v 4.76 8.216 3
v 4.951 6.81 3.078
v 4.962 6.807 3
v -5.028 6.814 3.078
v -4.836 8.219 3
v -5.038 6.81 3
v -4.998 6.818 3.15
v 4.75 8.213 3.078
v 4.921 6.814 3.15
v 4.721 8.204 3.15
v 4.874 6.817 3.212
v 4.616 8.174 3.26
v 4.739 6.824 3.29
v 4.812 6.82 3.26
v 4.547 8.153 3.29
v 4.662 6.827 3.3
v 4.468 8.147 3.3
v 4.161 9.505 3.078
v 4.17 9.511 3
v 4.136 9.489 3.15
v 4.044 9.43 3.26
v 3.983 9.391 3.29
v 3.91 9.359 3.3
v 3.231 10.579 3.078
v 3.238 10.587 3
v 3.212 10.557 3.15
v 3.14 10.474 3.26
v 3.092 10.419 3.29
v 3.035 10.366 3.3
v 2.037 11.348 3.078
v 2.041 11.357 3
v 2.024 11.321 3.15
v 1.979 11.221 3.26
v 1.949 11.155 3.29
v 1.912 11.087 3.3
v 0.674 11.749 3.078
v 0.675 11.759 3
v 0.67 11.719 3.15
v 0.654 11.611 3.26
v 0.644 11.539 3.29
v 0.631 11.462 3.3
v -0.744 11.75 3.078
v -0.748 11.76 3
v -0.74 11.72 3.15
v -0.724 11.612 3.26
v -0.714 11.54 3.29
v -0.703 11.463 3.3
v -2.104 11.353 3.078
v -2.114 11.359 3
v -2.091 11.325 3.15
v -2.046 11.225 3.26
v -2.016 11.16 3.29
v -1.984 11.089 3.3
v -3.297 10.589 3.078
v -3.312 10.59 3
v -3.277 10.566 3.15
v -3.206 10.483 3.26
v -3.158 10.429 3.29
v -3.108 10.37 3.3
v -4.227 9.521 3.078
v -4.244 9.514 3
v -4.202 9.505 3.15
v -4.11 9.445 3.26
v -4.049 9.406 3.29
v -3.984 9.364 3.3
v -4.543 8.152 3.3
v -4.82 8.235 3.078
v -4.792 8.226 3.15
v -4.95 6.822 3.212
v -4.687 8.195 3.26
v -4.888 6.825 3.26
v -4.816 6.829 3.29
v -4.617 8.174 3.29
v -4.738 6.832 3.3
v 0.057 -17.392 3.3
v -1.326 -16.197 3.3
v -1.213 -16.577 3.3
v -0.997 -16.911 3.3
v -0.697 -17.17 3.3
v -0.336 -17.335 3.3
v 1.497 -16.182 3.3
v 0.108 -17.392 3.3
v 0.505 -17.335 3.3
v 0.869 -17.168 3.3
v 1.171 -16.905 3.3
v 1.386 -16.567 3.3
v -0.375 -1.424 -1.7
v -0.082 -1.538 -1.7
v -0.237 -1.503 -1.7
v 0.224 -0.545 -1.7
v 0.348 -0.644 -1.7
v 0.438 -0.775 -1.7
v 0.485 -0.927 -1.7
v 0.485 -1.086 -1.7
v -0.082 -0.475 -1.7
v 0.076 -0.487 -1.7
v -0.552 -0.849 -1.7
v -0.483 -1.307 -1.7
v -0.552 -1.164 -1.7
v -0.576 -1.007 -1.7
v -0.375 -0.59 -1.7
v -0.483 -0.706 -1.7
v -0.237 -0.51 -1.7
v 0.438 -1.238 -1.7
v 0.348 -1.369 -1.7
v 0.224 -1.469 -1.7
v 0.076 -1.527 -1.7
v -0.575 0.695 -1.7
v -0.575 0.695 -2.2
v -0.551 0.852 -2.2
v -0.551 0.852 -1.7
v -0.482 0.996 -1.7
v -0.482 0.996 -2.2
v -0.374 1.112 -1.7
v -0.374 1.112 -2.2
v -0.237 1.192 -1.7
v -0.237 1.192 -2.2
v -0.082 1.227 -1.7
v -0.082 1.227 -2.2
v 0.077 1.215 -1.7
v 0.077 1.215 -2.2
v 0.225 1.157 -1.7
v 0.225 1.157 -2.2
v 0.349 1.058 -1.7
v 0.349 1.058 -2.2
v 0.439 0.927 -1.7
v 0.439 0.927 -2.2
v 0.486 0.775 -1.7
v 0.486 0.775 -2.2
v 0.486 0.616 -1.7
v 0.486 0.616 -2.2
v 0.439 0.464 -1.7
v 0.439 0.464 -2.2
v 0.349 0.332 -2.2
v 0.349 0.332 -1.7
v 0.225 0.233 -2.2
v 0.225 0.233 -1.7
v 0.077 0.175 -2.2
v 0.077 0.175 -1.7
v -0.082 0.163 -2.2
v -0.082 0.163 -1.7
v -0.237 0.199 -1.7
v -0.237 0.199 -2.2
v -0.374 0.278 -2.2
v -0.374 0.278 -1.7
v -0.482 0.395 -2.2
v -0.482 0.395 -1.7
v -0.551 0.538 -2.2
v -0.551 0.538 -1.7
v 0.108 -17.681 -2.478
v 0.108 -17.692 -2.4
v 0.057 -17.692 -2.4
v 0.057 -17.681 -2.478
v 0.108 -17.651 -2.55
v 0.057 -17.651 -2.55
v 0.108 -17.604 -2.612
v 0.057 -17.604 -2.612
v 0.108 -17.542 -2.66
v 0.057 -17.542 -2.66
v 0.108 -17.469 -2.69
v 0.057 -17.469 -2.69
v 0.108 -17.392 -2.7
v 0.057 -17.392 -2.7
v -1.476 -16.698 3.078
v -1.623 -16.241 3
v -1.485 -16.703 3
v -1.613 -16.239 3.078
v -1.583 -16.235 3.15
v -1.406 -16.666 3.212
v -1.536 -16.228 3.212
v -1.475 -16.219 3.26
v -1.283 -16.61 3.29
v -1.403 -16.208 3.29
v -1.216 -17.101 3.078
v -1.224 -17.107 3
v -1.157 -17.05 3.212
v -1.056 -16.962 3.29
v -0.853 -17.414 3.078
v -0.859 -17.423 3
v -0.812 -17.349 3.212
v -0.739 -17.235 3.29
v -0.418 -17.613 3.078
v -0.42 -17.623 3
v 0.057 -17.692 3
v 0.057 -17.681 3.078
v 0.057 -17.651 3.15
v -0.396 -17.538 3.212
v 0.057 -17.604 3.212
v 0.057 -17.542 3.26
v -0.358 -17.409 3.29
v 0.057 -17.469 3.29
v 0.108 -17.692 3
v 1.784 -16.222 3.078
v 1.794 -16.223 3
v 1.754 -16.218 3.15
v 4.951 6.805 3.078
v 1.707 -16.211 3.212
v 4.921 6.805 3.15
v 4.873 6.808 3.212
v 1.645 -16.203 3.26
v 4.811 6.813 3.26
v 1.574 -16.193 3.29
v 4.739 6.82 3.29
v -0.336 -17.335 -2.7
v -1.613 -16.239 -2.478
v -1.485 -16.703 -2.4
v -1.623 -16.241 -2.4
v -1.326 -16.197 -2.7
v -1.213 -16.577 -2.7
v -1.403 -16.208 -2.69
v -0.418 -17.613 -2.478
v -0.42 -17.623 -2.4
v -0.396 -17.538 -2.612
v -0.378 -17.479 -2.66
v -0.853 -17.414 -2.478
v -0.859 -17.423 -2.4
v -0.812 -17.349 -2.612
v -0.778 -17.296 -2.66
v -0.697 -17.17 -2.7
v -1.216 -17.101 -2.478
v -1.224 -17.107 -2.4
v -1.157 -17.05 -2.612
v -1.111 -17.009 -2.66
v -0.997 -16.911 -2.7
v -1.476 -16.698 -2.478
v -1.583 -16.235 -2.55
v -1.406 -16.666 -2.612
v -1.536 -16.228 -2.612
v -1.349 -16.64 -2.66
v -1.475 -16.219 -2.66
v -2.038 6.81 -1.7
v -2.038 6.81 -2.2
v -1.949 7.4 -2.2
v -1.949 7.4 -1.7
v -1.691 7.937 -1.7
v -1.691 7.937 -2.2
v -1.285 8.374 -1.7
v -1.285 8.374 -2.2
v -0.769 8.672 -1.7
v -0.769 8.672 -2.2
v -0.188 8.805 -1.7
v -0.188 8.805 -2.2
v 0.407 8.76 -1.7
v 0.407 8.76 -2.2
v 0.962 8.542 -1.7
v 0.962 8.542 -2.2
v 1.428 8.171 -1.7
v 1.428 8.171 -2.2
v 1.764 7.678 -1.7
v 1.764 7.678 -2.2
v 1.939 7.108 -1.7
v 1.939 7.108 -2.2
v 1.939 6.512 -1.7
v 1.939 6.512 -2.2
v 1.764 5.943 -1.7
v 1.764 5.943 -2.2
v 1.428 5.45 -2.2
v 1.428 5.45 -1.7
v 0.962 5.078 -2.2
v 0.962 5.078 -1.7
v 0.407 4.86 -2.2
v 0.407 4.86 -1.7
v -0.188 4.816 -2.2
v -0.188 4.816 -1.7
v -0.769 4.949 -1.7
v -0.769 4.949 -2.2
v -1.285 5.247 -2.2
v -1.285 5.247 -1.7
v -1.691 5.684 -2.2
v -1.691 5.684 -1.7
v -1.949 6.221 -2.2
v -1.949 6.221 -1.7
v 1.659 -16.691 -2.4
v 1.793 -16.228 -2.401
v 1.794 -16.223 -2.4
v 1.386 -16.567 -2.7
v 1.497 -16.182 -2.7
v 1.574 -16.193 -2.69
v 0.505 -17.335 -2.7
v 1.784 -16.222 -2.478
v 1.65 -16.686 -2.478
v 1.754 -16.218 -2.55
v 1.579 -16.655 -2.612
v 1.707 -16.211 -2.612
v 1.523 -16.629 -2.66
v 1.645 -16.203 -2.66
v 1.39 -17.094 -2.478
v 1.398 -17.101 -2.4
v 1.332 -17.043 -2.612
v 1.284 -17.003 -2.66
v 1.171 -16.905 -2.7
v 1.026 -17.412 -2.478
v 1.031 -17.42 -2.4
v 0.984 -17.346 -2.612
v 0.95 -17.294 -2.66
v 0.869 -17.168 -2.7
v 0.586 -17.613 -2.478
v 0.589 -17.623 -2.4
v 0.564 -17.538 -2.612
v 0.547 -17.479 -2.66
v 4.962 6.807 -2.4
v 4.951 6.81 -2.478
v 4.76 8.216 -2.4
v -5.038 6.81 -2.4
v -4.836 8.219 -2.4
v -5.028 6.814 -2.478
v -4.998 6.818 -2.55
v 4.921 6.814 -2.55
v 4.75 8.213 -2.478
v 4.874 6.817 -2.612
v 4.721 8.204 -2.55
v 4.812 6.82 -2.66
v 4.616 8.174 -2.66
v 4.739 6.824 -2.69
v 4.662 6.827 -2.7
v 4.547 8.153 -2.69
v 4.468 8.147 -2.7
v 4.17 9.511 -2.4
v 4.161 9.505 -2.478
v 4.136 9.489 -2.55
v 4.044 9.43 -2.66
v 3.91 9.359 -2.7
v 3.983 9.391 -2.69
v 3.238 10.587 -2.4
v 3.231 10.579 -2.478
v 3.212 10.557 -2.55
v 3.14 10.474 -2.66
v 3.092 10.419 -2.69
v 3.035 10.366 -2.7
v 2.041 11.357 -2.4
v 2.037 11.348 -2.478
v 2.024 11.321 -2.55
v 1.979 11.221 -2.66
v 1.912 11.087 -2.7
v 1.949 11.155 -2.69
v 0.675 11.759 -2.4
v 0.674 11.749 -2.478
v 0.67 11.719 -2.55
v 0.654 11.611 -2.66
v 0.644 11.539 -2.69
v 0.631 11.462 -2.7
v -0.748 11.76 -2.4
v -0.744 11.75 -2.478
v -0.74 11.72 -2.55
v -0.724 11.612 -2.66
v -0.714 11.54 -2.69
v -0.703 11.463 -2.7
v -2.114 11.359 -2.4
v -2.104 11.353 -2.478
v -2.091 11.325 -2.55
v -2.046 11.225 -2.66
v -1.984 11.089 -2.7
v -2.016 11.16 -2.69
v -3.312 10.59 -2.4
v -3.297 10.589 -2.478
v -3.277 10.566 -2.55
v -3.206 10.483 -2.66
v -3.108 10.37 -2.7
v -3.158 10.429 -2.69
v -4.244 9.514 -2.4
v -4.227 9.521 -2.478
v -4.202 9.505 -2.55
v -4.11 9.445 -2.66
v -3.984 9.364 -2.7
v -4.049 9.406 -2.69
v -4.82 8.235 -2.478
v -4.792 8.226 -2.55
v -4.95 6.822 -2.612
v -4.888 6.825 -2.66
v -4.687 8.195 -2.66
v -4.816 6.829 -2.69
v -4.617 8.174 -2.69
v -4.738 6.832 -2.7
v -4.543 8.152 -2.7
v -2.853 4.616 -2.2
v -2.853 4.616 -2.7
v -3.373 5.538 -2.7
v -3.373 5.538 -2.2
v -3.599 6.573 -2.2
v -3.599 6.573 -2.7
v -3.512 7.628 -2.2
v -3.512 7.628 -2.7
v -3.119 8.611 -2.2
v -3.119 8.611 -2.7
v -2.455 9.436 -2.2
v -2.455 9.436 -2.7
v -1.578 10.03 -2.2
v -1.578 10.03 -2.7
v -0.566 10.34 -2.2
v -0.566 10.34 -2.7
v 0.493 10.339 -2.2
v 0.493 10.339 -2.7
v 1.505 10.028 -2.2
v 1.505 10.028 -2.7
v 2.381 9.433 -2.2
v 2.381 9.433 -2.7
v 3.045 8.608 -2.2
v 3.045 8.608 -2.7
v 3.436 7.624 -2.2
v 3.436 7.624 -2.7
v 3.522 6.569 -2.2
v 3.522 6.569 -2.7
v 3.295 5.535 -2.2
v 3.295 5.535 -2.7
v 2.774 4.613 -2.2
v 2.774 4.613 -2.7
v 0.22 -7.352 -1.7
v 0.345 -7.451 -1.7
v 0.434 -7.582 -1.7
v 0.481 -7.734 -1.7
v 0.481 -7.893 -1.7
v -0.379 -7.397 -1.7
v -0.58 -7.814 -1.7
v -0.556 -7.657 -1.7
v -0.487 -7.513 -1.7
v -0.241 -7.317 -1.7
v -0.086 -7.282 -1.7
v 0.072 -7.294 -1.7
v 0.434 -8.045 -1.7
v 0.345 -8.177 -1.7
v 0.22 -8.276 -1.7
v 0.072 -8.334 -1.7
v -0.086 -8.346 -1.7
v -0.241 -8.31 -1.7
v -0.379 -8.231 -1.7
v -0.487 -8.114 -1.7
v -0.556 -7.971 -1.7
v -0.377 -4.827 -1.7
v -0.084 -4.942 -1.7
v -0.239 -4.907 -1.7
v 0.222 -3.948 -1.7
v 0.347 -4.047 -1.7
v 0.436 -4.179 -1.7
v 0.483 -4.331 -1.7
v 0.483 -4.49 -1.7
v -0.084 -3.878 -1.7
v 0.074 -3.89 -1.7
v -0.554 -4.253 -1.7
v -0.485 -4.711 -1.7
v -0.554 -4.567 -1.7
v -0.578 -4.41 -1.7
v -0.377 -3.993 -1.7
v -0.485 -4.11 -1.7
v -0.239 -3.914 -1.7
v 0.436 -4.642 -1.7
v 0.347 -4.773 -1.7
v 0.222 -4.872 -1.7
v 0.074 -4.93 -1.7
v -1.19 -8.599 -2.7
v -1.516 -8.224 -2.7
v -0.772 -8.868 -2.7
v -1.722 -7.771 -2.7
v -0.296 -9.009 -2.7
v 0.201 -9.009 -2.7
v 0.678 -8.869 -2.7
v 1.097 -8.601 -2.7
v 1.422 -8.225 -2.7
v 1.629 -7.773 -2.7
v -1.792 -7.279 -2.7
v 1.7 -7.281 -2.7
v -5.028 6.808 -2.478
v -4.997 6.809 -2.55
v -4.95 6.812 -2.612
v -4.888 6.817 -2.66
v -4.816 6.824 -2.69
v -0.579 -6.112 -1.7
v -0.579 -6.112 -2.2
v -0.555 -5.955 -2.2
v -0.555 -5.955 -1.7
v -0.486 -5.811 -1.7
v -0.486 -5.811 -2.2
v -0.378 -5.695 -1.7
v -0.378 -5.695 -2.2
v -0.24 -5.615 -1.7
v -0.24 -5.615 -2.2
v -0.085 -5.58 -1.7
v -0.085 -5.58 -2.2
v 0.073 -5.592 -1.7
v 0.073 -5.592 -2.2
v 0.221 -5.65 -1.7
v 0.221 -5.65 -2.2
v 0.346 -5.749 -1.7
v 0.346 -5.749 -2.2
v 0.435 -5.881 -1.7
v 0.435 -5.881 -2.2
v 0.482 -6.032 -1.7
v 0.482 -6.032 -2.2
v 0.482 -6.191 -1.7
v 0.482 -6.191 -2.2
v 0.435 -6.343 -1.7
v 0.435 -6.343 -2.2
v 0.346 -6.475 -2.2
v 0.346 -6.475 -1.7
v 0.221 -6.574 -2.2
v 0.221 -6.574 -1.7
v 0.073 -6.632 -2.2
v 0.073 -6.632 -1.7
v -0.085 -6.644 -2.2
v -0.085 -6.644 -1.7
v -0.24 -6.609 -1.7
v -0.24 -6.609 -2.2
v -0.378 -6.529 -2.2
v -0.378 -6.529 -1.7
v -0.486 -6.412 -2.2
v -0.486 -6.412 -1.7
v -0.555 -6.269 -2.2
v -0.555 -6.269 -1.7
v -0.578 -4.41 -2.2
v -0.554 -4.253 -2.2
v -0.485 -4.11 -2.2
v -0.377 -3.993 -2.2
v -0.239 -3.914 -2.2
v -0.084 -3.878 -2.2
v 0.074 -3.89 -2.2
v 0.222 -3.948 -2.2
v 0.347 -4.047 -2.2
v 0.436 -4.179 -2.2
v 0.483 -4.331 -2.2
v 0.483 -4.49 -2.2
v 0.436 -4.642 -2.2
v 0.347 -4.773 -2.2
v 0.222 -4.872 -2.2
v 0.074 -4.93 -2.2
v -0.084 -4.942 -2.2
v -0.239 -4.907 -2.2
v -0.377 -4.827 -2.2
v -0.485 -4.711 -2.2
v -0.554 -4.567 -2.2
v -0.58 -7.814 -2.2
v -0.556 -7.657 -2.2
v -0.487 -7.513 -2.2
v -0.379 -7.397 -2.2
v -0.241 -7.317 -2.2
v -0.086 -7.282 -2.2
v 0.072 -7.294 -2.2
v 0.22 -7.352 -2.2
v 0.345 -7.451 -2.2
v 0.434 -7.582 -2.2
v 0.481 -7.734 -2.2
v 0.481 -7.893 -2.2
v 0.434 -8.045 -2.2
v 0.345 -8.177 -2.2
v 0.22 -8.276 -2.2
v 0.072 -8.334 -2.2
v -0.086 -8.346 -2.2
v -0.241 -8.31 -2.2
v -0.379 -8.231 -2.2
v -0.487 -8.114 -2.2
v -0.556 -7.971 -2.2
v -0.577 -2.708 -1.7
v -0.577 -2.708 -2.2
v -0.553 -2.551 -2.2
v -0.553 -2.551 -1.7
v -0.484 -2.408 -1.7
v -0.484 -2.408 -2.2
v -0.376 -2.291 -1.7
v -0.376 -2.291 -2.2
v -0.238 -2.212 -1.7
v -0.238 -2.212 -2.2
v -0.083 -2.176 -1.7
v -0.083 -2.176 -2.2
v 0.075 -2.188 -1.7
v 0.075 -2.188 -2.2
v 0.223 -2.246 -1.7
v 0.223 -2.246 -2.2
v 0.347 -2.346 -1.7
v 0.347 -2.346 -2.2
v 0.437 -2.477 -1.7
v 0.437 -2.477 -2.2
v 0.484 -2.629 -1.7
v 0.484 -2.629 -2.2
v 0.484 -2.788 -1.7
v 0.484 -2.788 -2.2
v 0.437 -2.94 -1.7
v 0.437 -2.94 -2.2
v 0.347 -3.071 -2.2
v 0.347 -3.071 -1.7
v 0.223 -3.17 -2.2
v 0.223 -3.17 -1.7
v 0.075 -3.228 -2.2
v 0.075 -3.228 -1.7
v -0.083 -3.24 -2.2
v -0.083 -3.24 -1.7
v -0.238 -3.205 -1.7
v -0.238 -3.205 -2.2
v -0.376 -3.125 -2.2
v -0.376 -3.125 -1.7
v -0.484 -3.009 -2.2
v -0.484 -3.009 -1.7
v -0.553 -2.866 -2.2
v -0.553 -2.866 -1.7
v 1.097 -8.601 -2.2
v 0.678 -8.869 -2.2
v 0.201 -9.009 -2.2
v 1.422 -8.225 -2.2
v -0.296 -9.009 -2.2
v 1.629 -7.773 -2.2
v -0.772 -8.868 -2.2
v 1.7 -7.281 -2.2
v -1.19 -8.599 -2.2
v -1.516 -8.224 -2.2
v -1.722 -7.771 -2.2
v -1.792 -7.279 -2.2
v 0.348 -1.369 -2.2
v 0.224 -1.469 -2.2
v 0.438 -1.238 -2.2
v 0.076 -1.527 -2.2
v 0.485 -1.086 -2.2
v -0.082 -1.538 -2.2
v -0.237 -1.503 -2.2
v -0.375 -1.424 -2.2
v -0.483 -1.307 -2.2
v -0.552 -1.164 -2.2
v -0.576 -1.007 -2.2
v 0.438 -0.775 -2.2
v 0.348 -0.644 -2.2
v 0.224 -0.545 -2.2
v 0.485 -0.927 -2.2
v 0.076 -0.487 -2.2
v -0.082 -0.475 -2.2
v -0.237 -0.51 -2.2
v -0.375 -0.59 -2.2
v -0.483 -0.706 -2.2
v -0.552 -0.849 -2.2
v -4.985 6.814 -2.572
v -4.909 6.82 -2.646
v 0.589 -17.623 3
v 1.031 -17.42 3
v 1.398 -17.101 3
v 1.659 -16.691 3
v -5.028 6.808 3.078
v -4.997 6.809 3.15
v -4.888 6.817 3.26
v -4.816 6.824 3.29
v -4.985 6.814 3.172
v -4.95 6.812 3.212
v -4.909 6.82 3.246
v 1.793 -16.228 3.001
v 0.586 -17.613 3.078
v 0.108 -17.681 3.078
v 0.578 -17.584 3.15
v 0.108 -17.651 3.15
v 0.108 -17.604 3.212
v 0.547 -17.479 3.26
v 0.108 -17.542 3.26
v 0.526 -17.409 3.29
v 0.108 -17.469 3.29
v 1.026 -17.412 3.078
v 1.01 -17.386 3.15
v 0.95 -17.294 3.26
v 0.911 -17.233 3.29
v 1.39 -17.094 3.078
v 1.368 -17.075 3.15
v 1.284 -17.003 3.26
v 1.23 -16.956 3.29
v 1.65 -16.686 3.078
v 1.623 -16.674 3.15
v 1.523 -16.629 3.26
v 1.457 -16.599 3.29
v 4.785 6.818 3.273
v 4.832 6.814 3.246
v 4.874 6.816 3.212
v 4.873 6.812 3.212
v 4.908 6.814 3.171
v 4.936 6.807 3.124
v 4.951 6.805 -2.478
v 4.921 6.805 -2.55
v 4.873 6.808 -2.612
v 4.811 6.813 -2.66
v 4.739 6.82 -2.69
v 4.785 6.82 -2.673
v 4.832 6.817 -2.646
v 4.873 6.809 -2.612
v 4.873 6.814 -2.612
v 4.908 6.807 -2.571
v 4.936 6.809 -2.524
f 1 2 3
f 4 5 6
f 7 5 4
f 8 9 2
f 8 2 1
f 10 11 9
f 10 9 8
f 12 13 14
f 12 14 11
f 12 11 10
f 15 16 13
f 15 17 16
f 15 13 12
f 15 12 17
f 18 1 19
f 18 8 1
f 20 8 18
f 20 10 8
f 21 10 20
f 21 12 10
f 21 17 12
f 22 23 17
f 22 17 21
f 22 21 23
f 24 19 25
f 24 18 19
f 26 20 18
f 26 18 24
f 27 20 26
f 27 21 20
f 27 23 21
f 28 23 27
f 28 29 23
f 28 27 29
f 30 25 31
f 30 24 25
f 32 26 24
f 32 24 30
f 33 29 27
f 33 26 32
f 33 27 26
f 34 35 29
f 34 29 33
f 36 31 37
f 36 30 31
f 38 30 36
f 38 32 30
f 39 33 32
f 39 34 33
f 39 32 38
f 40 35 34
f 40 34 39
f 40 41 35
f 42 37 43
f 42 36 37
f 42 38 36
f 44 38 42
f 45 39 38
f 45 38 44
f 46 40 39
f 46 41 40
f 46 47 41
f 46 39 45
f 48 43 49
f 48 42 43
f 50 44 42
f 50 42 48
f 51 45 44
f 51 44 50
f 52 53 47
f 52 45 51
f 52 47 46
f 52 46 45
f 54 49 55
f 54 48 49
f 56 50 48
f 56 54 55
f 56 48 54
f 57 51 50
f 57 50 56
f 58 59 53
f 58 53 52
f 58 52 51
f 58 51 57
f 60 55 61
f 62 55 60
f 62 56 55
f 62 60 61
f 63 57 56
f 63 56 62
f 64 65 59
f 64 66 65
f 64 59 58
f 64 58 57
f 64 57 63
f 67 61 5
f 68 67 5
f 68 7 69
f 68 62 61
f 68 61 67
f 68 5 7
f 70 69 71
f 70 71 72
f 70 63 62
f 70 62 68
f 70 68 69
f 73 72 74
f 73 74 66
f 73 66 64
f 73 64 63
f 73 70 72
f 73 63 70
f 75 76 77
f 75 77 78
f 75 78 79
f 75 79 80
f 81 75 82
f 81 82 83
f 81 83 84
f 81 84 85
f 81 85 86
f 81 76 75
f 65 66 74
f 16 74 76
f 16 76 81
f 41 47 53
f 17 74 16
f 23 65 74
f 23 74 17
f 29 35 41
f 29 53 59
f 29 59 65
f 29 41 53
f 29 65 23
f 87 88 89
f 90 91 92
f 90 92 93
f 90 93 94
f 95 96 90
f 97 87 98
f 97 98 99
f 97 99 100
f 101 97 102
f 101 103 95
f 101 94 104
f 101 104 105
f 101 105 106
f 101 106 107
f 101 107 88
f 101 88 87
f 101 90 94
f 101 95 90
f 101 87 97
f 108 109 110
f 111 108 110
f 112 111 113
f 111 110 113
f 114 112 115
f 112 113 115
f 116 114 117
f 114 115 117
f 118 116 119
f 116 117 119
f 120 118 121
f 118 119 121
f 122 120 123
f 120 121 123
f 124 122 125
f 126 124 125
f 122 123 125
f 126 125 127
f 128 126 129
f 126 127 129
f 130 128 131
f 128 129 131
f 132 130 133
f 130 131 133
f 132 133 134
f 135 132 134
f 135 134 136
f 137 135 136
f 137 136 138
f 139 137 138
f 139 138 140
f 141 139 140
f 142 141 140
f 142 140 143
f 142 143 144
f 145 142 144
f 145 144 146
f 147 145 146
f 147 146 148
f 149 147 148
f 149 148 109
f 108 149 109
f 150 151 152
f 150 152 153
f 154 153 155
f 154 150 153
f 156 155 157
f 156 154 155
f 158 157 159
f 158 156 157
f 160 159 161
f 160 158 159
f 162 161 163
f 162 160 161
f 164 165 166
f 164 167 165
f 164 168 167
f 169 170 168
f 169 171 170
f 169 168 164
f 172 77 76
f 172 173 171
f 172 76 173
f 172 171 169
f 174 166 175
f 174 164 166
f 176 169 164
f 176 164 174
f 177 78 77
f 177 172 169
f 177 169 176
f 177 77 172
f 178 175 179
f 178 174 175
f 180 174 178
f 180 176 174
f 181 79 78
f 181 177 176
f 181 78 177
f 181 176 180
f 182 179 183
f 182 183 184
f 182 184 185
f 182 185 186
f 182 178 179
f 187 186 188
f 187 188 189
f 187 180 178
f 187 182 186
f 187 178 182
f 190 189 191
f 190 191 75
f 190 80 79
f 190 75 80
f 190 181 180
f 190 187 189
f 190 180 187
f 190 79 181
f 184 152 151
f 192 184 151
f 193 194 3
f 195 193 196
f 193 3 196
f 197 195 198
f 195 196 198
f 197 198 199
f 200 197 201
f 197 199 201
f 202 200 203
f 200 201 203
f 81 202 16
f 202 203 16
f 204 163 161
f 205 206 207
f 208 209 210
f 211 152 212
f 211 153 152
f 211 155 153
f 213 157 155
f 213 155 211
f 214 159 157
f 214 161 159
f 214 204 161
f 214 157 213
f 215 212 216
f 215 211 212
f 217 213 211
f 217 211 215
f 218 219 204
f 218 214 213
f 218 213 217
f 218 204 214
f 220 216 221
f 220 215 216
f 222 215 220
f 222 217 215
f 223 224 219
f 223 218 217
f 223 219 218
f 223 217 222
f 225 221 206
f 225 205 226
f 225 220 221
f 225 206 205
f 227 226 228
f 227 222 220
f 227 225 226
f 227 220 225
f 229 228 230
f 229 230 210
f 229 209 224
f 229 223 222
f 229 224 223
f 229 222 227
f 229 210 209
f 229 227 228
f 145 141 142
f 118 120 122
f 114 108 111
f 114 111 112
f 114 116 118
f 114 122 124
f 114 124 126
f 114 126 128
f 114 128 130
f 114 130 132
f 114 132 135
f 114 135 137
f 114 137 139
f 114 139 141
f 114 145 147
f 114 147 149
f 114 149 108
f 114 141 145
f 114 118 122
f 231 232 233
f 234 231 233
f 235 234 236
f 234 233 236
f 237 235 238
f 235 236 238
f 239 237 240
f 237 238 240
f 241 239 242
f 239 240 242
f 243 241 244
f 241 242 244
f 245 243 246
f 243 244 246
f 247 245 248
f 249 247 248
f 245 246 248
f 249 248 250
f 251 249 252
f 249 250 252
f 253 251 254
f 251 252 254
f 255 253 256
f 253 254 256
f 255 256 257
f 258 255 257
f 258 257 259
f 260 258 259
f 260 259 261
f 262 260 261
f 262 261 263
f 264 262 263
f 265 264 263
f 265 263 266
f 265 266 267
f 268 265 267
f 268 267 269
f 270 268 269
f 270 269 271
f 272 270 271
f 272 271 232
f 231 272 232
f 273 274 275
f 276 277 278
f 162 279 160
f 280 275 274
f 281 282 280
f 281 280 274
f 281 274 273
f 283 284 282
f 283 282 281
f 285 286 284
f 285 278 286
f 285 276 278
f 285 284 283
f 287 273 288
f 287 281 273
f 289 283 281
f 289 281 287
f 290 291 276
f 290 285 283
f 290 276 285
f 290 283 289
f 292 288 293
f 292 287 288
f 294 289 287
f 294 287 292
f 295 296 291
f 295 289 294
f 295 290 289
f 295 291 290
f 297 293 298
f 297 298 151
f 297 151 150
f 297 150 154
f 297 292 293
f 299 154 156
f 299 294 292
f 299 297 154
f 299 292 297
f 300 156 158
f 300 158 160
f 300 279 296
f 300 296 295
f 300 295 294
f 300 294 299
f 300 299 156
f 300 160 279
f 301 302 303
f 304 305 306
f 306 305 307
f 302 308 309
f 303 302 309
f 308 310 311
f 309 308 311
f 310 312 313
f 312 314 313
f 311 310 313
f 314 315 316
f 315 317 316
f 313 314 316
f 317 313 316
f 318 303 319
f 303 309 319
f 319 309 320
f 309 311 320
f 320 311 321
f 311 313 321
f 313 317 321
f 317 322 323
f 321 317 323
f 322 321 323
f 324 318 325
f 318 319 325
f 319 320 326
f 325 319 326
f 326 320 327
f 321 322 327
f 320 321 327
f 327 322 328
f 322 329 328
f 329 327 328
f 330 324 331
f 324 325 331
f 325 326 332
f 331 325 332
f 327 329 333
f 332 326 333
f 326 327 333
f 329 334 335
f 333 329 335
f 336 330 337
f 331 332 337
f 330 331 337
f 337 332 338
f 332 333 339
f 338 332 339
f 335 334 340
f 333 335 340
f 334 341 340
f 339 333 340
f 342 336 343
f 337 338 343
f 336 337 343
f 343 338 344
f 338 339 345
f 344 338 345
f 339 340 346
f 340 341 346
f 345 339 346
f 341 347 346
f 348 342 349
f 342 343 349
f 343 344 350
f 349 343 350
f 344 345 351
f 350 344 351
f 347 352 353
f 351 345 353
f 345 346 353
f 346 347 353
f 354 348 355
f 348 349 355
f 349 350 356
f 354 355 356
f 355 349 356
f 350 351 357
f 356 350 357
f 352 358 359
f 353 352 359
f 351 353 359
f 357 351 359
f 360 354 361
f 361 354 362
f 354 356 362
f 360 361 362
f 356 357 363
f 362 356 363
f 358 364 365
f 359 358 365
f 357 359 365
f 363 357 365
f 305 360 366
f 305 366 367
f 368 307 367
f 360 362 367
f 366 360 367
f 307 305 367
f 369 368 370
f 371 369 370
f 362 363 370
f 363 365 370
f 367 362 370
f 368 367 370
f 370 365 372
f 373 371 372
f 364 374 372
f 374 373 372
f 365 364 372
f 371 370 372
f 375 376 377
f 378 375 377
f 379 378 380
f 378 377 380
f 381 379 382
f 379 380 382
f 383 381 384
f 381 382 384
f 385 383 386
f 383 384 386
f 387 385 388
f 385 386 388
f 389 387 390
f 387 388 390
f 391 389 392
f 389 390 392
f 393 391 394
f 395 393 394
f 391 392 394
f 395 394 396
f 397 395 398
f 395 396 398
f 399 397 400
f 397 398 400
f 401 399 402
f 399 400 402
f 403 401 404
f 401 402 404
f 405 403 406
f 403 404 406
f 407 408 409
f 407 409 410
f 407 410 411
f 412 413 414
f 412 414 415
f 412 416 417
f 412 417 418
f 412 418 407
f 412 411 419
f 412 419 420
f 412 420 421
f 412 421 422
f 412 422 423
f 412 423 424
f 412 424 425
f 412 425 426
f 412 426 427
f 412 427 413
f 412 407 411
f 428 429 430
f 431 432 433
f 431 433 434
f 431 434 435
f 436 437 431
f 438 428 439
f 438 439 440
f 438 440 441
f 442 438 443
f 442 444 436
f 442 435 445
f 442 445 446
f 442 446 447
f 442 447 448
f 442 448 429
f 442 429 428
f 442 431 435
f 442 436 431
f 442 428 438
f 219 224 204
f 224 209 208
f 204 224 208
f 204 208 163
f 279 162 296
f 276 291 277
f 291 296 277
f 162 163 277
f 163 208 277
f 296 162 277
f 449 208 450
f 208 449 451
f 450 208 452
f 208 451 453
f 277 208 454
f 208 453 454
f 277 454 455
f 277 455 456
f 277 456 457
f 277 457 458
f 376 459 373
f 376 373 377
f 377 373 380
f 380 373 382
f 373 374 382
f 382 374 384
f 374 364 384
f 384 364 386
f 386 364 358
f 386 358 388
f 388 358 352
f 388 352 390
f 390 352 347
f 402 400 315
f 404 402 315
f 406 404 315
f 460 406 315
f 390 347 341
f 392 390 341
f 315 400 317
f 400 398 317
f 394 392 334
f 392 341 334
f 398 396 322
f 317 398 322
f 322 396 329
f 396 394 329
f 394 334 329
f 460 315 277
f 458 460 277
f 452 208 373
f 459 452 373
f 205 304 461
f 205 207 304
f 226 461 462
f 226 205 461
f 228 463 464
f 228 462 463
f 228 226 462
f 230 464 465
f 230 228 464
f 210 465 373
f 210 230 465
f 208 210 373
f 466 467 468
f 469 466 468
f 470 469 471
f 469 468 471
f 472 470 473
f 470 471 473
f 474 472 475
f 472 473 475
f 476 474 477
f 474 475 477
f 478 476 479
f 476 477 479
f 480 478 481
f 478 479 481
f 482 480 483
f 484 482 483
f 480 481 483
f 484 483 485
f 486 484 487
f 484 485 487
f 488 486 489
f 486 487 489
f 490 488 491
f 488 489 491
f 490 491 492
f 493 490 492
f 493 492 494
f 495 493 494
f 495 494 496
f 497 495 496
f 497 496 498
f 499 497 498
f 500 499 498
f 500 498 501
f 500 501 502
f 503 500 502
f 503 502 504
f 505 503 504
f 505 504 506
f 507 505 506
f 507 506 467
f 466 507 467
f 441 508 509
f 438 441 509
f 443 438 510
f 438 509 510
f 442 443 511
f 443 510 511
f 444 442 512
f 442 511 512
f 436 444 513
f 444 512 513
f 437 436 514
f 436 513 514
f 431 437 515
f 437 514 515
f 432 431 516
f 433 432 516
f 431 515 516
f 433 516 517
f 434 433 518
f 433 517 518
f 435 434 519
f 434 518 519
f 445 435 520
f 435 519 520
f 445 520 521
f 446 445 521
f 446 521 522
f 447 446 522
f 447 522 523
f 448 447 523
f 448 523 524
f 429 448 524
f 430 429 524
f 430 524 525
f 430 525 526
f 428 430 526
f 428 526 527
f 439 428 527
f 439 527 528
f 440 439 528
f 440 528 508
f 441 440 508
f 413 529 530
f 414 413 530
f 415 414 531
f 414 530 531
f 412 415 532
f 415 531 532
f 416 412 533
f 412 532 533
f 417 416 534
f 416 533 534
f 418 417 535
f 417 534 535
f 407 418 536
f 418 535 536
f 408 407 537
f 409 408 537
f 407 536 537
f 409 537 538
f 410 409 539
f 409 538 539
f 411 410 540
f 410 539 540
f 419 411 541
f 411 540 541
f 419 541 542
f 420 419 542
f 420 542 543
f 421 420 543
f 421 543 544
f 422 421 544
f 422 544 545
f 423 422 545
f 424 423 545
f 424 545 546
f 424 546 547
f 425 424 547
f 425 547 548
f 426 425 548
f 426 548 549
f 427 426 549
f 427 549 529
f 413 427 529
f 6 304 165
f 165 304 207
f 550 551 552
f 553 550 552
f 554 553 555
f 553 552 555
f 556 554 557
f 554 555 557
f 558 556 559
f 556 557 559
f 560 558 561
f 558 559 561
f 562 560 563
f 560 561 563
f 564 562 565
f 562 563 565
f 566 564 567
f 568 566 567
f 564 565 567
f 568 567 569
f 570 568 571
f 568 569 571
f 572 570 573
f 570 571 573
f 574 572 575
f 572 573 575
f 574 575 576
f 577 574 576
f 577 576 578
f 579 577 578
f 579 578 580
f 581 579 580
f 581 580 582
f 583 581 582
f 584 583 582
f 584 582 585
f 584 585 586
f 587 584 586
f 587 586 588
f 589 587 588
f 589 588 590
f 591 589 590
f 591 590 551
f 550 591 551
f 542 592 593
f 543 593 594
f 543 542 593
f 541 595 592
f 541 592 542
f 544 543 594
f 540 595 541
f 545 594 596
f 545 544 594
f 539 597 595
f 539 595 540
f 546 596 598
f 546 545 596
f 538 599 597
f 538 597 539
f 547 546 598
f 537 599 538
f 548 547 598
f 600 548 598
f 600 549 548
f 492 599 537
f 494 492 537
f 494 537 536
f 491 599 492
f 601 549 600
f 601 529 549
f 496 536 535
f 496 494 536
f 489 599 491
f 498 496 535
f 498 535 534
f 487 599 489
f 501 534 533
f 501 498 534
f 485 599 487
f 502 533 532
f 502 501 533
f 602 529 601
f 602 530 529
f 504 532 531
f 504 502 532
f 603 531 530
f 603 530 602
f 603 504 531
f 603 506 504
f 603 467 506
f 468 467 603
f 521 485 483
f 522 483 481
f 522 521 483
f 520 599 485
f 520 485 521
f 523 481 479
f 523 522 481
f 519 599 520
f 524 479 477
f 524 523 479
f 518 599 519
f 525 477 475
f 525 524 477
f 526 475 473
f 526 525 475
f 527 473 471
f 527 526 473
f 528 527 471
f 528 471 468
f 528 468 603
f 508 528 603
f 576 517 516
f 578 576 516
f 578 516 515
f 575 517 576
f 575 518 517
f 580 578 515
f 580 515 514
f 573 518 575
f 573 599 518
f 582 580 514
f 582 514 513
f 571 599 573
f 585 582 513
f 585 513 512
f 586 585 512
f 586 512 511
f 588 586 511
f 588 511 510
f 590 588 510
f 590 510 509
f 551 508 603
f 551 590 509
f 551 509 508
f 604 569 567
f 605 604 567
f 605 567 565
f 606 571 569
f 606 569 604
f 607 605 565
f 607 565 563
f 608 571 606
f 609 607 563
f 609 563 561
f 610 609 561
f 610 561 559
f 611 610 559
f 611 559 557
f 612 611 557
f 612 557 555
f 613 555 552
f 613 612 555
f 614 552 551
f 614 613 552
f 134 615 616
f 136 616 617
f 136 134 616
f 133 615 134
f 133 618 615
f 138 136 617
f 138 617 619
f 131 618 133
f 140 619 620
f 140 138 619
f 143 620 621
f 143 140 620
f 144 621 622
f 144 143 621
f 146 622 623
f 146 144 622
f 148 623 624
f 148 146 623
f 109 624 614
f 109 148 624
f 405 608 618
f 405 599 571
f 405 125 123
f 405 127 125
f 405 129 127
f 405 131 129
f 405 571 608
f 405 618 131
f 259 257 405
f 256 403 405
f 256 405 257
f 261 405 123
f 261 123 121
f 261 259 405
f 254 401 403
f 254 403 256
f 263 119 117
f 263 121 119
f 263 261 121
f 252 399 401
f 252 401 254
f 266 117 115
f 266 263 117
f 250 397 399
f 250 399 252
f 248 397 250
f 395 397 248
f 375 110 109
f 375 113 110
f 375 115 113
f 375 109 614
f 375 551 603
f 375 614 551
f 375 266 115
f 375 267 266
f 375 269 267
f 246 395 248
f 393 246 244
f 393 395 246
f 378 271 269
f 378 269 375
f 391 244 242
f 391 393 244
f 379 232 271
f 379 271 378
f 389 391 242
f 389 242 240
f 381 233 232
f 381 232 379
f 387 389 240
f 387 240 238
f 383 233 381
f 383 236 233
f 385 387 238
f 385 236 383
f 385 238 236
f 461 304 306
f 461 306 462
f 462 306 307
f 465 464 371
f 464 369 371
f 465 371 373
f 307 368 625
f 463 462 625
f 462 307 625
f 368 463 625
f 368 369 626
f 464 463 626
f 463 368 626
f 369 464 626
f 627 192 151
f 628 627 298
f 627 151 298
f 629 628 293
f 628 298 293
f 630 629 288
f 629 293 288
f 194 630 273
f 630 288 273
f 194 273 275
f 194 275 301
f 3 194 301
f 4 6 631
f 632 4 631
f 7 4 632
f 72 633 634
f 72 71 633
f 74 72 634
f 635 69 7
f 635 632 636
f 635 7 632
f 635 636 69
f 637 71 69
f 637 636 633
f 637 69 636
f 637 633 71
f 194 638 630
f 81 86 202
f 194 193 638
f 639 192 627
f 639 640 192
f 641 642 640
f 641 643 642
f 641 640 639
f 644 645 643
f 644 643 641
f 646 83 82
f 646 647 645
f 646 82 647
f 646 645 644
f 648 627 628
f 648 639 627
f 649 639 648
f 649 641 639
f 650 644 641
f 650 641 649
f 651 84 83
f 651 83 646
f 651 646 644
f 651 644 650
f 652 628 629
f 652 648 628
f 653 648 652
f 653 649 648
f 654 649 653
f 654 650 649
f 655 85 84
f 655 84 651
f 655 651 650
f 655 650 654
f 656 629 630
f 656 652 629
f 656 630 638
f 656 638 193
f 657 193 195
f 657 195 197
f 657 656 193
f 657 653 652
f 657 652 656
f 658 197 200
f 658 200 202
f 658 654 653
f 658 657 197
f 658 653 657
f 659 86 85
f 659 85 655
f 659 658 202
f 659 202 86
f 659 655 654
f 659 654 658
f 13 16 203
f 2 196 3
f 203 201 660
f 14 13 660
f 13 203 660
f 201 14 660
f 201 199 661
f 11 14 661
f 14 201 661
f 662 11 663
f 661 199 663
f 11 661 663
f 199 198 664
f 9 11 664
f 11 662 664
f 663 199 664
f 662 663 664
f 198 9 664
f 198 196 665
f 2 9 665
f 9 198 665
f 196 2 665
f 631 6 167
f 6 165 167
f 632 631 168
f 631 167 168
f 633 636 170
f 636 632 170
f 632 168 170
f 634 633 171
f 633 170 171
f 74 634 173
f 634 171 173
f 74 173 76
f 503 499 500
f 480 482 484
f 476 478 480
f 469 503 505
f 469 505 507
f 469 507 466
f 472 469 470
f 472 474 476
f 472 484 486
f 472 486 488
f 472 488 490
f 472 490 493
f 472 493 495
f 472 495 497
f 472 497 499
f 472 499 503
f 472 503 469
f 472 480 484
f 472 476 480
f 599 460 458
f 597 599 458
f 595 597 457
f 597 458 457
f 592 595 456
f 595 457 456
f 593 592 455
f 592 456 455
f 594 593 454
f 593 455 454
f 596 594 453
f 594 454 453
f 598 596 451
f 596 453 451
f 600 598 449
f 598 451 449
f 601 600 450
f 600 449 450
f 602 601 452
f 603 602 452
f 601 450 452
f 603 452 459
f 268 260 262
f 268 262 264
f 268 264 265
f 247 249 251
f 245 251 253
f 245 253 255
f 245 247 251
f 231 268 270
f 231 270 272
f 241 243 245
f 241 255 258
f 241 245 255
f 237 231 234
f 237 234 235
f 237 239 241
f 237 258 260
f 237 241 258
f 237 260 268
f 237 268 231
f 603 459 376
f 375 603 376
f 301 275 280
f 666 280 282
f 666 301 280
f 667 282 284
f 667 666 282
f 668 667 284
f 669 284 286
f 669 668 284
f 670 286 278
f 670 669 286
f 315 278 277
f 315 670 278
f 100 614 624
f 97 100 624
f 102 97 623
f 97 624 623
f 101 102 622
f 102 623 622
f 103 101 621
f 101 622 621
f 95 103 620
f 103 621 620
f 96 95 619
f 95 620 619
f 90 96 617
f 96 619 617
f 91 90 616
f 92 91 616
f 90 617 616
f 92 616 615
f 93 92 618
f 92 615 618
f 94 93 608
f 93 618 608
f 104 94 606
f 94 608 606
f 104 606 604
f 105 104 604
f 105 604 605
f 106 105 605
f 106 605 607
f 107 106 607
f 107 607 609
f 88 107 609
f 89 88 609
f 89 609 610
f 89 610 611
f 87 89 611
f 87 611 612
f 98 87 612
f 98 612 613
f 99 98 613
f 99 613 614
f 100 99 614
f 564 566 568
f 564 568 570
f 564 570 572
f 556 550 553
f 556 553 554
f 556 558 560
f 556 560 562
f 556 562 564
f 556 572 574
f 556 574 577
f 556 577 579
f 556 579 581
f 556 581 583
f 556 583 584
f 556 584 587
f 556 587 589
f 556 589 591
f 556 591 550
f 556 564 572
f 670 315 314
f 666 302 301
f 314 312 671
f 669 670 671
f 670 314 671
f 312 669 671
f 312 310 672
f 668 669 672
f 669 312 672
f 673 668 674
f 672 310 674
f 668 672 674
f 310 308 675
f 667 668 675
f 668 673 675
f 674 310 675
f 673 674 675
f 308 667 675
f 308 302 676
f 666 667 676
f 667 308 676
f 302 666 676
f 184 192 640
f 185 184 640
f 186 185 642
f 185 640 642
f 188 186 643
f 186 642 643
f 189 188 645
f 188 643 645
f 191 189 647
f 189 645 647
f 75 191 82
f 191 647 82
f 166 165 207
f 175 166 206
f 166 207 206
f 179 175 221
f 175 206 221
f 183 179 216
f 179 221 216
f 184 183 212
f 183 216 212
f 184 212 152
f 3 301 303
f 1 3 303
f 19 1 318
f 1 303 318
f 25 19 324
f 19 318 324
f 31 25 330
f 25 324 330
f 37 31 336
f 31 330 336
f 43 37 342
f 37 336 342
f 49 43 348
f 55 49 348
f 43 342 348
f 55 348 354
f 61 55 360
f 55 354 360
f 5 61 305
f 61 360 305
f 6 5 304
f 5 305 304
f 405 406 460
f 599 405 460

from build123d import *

# Parameters (mm, degrees)
BOSS_EXTRUDE1_DEPTH = 0.6
FILLET3_R           = 0.03
FILLET4_R           = 0.17
SCALE2_SCALE        = 10
SKETCH4_R           = 0.5334
SKETCH4_R_2         = 2
CUT_EXTRUDE5_DEPTH  = 1
SKETCH4_3_R         = 0.5334
SKETCH4_3_R_2       = 2
CUT_EXTRUDE6_DEPTH  = 0.5


with BuildPart() as part:
    # Sketch1 → Boss-Extrude1 (new body)
    with BuildSketch(Plane.XY):
        with BuildLine():
            Line((-0.136993219, -2.45), (0.163006781, -2.450375949))
            Line((0.163006781, -2.450375949), (0.499999859, -0.000375949))
            ThreePointArc((0.499999859, -0.000375949), (0.000187974, 0.499999965), (-0.5, 0))
            Line((-0.5, 0), (-0.136993219, -2.45))
        make_face()
    extrude(amount=BOSS_EXTRUDE1_DEPTH)

    # Fillet3
    fillet3_edges = [part.edges().sort_by_distance(p)[0] for p in [
        (0.33150332, -1.225375949, 0.6),
        (0.000187974, 0.499999965, 0.6),
        (-0.318496609, -1.225, 0.6),
        (0.000187974, 0.499999965, 0),
        (0.33150332, -1.225375949, 0),
        (0.013006781, -2.450187974, 0),
        (-0.318496609, -1.225, 0),
        (0.013006781, -2.450187974, 0.6),
    ]]
    fillet(fillet3_edges, radius=FILLET3_R)

    # Fillet4
    # the kernel refuses this fillet: 0.17 mm, written as the material it takes off along each edge
    with BuildSketch(Plane(origin=(0.009701663, -2.280183699, 0), x_dir=(-0.001253160871338018, -0.9999992147936071, 0), z_dir=(0.9999992147936071, -0.001253160871338018, 0))) as fillet4_piece_1:
        with BuildLine():
            CenterArc((0.14, -0.03), 0.03, 0, 90)
            Line((0.17, -0.03), (0.17, 0))
            Line((0.17, 0), (0.14, 0))
        make_face()
    revolve(axis=Axis((0.009701663, -2.280183699, 0), (0, 0, -1)), revolution_arc=81.500227405, mode=Mode.SUBTRACT)
    with BuildSketch(Plane(origin=(0.014814914, -2.280190107, 0), x_dir=(0.9906723955714478, -0.1362651997126514, 0), z_dir=(0.1362651997126514, 0.9906723955714478, 0))) as fillet4_piece_2:
        with BuildLine():
            CenterArc((0.14, -0.03), 0.03, 0, 90)
            Line((0.17, -0.03), (0.17, 0))
            Line((0.17, 0), (0.14, 0))
        make_face()
    revolve(axis=Axis((0.014814914, -2.280190107, 0), (0, 0, -1)), revolution_arc=82.240014231, mode=Mode.SUBTRACT)
    with BuildSketch(Plane(origin=(0.014814914, -2.280190107, 0.6), x_dir=(-0.001253160871338018, -0.9999992147936071, 0), z_dir=(-0.9999992147936071, 0.001253160871338018, 0))) as fillet4_piece_3:
        with BuildLine():
            CenterArc((0.14, -0.03), 0.03, 0, 90)
            Line((0.17, -0.03), (0.17, 0))
            Line((0.17, 0), (0.14, 0))
        make_face()
    revolve(axis=Axis((0.014814914, -2.280190107, 0.6), (0, 0, 1)), revolution_arc=82.240014231, mode=Mode.SUBTRACT)
    with BuildSketch(Plane(origin=(0.009701663, -2.280183699, 0.6), x_dir=(-0.9892008974747571, -0.14656597297850232, 0), z_dir=(-0.14656597297850232, 0.9892008974747571, 0))) as fillet4_piece_4:
        with BuildLine():
            CenterArc((0.14, -0.03), 0.03, 0, 90)
            Line((0.17, -0.03), (0.17, 0))
            Line((0.17, 0), (0.14, 0))
        make_face()
    revolve(axis=Axis((0.009701663, -2.280183699, 0.6), (0, 0, 1)), revolution_arc=81.500227405, mode=Mode.SUBTRACT)
    with BuildSketch(Plane(origin=(0.163006781, -2.450375949, 0), x_dir=(-0.999999214793607, 0.001253160871339251, 0), z_dir=(0, 0, 1))) as fillet4_piece_5:
        with BuildLine():
            CenterArc((FILLET4_R * 0.872970713312, -FILLET4_R), FILLET4_R, 90, 82.240014231)
            Line((-FILLET4_R * 0.117871666593, -FILLET4_R * 0.864976379166), (0, 0))
            Line((0, 0), (FILLET4_R * 0.872970713312, 0))
        make_face()
    extrude(amount=0.6, mode=Mode.SUBTRACT)
    with BuildSketch(Plane(origin=(-0.136993219, -2.45, 0), x_dir=(-0.14656597297850246, 0.9892008974747571, 0), z_dir=(0, 0, 1))) as fillet4_piece_6:
        with BuildLine():
            CenterArc((FILLET4_R * 0.861658584387, -FILLET4_R), FILLET4_R, 90, 81.500227405)
            Line((-FILLET4_R * 0.127357865618, -FILLET4_R * 0.852194514247), (0, 0))
            Line((0, 0), (FILLET4_R * 0.861658584387, 0))
        make_face()
    extrude(amount=0.6, mode=Mode.SUBTRACT)


with BuildPart() as part_1:
    # Scale2: scaled about (0.00425557, -0.756697726, 0.299999998)
    add(part.part.scale(SCALE2_SCALE).moved(Location((-0.03830013, 6.810279534, -2.699999982))))

    # Sketch4 → Cut-Extrude5 (cut)
    with BuildSketch(Plane(origin=(0, 0, -2.70000001), x_dir=(-1, 0, 0), z_dir=(0, 0, -1))):
        with Locations((0.041676609, 0.695226981)):
            Circle(SKETCH4_R)
        with Locations((0.042616275, -1.00657276)):
            Circle(SKETCH4_R)
        with Locations((0.04355594, -2.7083725)):
            Circle(SKETCH4_R)
        with Locations((0.044495606, -4.410172241)):
            Circle(SKETCH4_R)
        with Locations((0.045435271, -6.111971981)):
            Circle(SKETCH4_R)
        with Locations((0.046374936, -7.813771722)):
            Circle(SKETCH4_R)
        with Locations((0.038300124, 6.810276049)):
            Circle(SKETCH4_R_2)
    extrude(amount=-CUT_EXTRUDE5_DEPTH, mode=Mode.SUBTRACT)

    # Sketch4<3> → Cut-Extrude6 (cut)
    with BuildSketch(Plane(origin=(0, 0, -2.70000001), x_dir=(-1, 0, 0), z_dir=(0, 0, -1))):
        with BuildLine():
            Line((1.792330148, -7.279407594), (2.852562233, 4.61584025))
            ThreePointArc((2.852562233, 4.61584025), (0.036329632, 10.378975505), (-2.77353691, 4.612733744))
            Line((-2.77353691, 4.612733744), (-1.700169319, -7.281336012))
            ThreePointArc((-1.700169319, -7.281336012), (0.047044623, -9.026621537), (1.792330148, -7.279407594))
        make_face()
        with Locations((0.041676609, 0.695226981)):
            Circle(SKETCH4_3_R, mode=Mode.SUBTRACT)
        with Locations((0.042616275, -1.00657276)):
            Circle(SKETCH4_3_R, mode=Mode.SUBTRACT)
        with Locations((0.04355594, -2.7083725)):
            Circle(SKETCH4_3_R, mode=Mode.SUBTRACT)
        with Locations((0.044495606, -4.410172241)):
            Circle(SKETCH4_3_R, mode=Mode.SUBTRACT)
        with Locations((0.045435271, -6.111971981)):
            Circle(SKETCH4_3_R, mode=Mode.SUBTRACT)
        with Locations((0.046374936, -7.813771722)):
            Circle(SKETCH4_3_R, mode=Mode.SUBTRACT)
        with Locations((0.038300124, 6.810276049)):
            Circle(SKETCH4_3_R_2, mode=Mode.SUBTRACT)
    extrude(amount=-CUT_EXTRUDE6_DEPTH, mode=Mode.SUBTRACT)


solid = part_1.part
